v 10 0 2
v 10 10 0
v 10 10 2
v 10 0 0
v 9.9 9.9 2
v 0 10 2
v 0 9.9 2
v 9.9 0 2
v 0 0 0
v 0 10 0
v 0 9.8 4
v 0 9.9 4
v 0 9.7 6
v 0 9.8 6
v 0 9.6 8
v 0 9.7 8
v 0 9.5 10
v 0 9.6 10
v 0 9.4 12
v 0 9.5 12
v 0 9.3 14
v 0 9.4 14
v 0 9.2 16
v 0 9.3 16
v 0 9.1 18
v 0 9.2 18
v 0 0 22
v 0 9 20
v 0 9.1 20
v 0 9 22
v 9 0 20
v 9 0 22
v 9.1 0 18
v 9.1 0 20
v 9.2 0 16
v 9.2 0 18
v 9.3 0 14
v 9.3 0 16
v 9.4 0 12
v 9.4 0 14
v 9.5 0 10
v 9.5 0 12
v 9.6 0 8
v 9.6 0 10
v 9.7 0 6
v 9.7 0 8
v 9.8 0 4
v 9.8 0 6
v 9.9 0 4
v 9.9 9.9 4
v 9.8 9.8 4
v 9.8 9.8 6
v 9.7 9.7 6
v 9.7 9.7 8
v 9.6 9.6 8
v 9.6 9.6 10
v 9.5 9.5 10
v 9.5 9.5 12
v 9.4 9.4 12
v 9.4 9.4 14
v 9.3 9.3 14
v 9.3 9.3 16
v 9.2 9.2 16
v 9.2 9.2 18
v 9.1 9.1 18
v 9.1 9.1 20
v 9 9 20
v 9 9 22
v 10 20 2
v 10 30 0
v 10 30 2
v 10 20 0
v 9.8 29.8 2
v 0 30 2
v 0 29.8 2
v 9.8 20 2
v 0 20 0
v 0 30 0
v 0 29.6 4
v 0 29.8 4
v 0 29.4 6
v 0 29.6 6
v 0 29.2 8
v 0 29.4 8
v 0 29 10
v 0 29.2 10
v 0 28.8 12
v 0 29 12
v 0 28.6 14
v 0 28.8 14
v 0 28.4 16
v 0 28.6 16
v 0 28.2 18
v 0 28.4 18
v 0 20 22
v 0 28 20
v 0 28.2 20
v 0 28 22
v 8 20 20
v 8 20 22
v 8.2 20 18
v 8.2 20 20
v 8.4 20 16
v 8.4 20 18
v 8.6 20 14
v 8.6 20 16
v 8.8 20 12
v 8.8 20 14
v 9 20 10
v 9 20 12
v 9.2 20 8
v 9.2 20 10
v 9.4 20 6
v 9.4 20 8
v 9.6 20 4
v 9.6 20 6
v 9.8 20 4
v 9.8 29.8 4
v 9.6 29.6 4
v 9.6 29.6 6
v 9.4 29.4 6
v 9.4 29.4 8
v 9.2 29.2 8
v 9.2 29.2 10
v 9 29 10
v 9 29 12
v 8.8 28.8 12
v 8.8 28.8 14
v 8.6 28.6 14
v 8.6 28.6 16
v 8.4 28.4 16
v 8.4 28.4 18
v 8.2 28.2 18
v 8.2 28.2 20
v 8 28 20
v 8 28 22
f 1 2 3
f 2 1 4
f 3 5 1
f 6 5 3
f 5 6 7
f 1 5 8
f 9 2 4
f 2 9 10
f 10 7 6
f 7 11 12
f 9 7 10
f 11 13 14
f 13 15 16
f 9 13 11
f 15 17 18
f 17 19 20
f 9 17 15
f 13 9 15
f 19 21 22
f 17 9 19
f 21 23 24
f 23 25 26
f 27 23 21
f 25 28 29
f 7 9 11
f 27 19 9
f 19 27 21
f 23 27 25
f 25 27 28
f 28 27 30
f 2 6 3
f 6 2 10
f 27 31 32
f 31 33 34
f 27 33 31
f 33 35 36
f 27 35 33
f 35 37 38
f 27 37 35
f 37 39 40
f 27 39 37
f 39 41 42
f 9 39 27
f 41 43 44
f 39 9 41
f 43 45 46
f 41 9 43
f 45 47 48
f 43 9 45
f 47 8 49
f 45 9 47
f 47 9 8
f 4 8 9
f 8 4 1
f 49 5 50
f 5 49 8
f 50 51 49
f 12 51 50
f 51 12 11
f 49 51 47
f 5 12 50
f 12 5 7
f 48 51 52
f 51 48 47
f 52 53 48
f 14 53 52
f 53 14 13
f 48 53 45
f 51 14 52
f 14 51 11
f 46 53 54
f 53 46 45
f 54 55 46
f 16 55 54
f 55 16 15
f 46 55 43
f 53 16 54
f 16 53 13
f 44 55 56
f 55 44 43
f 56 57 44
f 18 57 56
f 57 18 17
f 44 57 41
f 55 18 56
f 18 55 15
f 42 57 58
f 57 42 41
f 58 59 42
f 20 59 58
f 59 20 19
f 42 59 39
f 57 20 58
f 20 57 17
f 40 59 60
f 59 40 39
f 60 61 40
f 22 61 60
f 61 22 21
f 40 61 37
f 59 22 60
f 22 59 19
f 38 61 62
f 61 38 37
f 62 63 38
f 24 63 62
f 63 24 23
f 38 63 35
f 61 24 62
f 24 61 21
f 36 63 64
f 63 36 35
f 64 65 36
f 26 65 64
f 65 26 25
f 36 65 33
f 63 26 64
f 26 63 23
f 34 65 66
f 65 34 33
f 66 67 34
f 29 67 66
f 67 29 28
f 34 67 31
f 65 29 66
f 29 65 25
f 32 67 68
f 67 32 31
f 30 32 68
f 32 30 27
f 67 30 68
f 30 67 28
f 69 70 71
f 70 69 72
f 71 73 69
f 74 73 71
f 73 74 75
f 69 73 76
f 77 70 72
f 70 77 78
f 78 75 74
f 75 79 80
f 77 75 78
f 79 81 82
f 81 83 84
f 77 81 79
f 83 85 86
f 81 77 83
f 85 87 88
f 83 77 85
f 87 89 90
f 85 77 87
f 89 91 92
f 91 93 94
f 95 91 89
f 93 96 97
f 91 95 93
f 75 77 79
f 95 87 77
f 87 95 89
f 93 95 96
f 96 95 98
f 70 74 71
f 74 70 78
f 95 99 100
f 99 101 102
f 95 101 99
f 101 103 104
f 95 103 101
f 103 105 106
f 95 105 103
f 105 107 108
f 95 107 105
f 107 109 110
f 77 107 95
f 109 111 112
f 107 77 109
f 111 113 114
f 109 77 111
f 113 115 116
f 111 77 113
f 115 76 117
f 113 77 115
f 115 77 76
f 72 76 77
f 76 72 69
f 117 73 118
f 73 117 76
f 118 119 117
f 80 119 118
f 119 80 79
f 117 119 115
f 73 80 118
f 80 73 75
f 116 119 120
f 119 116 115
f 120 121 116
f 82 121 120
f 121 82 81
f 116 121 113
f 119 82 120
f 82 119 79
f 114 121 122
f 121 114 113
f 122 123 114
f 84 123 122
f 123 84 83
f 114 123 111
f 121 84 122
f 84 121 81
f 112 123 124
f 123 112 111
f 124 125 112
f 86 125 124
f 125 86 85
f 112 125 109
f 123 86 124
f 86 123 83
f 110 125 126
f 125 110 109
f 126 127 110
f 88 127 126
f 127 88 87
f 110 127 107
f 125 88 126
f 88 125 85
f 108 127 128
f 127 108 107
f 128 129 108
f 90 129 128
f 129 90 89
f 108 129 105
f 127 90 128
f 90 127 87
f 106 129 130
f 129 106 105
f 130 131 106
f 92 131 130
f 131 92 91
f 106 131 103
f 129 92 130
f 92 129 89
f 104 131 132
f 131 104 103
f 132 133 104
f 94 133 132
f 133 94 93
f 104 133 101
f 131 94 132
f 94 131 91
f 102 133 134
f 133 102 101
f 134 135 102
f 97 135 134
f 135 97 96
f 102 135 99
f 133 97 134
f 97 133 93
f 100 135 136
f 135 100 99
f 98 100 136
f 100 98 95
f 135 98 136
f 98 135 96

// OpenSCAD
for (i=[0:10])
   translate([0,0,2*i])
     cube(size=[10 -(0.1 *i), 10 -(0.1 *i) , 2] , center = false);



translate([0,20,0]){
for (i=[0:10])
   translate([0,0,2*i])
     cube(size=[10 -(0.2 *i), 10 -(0.2 *i) , 2] , center = false);

}
